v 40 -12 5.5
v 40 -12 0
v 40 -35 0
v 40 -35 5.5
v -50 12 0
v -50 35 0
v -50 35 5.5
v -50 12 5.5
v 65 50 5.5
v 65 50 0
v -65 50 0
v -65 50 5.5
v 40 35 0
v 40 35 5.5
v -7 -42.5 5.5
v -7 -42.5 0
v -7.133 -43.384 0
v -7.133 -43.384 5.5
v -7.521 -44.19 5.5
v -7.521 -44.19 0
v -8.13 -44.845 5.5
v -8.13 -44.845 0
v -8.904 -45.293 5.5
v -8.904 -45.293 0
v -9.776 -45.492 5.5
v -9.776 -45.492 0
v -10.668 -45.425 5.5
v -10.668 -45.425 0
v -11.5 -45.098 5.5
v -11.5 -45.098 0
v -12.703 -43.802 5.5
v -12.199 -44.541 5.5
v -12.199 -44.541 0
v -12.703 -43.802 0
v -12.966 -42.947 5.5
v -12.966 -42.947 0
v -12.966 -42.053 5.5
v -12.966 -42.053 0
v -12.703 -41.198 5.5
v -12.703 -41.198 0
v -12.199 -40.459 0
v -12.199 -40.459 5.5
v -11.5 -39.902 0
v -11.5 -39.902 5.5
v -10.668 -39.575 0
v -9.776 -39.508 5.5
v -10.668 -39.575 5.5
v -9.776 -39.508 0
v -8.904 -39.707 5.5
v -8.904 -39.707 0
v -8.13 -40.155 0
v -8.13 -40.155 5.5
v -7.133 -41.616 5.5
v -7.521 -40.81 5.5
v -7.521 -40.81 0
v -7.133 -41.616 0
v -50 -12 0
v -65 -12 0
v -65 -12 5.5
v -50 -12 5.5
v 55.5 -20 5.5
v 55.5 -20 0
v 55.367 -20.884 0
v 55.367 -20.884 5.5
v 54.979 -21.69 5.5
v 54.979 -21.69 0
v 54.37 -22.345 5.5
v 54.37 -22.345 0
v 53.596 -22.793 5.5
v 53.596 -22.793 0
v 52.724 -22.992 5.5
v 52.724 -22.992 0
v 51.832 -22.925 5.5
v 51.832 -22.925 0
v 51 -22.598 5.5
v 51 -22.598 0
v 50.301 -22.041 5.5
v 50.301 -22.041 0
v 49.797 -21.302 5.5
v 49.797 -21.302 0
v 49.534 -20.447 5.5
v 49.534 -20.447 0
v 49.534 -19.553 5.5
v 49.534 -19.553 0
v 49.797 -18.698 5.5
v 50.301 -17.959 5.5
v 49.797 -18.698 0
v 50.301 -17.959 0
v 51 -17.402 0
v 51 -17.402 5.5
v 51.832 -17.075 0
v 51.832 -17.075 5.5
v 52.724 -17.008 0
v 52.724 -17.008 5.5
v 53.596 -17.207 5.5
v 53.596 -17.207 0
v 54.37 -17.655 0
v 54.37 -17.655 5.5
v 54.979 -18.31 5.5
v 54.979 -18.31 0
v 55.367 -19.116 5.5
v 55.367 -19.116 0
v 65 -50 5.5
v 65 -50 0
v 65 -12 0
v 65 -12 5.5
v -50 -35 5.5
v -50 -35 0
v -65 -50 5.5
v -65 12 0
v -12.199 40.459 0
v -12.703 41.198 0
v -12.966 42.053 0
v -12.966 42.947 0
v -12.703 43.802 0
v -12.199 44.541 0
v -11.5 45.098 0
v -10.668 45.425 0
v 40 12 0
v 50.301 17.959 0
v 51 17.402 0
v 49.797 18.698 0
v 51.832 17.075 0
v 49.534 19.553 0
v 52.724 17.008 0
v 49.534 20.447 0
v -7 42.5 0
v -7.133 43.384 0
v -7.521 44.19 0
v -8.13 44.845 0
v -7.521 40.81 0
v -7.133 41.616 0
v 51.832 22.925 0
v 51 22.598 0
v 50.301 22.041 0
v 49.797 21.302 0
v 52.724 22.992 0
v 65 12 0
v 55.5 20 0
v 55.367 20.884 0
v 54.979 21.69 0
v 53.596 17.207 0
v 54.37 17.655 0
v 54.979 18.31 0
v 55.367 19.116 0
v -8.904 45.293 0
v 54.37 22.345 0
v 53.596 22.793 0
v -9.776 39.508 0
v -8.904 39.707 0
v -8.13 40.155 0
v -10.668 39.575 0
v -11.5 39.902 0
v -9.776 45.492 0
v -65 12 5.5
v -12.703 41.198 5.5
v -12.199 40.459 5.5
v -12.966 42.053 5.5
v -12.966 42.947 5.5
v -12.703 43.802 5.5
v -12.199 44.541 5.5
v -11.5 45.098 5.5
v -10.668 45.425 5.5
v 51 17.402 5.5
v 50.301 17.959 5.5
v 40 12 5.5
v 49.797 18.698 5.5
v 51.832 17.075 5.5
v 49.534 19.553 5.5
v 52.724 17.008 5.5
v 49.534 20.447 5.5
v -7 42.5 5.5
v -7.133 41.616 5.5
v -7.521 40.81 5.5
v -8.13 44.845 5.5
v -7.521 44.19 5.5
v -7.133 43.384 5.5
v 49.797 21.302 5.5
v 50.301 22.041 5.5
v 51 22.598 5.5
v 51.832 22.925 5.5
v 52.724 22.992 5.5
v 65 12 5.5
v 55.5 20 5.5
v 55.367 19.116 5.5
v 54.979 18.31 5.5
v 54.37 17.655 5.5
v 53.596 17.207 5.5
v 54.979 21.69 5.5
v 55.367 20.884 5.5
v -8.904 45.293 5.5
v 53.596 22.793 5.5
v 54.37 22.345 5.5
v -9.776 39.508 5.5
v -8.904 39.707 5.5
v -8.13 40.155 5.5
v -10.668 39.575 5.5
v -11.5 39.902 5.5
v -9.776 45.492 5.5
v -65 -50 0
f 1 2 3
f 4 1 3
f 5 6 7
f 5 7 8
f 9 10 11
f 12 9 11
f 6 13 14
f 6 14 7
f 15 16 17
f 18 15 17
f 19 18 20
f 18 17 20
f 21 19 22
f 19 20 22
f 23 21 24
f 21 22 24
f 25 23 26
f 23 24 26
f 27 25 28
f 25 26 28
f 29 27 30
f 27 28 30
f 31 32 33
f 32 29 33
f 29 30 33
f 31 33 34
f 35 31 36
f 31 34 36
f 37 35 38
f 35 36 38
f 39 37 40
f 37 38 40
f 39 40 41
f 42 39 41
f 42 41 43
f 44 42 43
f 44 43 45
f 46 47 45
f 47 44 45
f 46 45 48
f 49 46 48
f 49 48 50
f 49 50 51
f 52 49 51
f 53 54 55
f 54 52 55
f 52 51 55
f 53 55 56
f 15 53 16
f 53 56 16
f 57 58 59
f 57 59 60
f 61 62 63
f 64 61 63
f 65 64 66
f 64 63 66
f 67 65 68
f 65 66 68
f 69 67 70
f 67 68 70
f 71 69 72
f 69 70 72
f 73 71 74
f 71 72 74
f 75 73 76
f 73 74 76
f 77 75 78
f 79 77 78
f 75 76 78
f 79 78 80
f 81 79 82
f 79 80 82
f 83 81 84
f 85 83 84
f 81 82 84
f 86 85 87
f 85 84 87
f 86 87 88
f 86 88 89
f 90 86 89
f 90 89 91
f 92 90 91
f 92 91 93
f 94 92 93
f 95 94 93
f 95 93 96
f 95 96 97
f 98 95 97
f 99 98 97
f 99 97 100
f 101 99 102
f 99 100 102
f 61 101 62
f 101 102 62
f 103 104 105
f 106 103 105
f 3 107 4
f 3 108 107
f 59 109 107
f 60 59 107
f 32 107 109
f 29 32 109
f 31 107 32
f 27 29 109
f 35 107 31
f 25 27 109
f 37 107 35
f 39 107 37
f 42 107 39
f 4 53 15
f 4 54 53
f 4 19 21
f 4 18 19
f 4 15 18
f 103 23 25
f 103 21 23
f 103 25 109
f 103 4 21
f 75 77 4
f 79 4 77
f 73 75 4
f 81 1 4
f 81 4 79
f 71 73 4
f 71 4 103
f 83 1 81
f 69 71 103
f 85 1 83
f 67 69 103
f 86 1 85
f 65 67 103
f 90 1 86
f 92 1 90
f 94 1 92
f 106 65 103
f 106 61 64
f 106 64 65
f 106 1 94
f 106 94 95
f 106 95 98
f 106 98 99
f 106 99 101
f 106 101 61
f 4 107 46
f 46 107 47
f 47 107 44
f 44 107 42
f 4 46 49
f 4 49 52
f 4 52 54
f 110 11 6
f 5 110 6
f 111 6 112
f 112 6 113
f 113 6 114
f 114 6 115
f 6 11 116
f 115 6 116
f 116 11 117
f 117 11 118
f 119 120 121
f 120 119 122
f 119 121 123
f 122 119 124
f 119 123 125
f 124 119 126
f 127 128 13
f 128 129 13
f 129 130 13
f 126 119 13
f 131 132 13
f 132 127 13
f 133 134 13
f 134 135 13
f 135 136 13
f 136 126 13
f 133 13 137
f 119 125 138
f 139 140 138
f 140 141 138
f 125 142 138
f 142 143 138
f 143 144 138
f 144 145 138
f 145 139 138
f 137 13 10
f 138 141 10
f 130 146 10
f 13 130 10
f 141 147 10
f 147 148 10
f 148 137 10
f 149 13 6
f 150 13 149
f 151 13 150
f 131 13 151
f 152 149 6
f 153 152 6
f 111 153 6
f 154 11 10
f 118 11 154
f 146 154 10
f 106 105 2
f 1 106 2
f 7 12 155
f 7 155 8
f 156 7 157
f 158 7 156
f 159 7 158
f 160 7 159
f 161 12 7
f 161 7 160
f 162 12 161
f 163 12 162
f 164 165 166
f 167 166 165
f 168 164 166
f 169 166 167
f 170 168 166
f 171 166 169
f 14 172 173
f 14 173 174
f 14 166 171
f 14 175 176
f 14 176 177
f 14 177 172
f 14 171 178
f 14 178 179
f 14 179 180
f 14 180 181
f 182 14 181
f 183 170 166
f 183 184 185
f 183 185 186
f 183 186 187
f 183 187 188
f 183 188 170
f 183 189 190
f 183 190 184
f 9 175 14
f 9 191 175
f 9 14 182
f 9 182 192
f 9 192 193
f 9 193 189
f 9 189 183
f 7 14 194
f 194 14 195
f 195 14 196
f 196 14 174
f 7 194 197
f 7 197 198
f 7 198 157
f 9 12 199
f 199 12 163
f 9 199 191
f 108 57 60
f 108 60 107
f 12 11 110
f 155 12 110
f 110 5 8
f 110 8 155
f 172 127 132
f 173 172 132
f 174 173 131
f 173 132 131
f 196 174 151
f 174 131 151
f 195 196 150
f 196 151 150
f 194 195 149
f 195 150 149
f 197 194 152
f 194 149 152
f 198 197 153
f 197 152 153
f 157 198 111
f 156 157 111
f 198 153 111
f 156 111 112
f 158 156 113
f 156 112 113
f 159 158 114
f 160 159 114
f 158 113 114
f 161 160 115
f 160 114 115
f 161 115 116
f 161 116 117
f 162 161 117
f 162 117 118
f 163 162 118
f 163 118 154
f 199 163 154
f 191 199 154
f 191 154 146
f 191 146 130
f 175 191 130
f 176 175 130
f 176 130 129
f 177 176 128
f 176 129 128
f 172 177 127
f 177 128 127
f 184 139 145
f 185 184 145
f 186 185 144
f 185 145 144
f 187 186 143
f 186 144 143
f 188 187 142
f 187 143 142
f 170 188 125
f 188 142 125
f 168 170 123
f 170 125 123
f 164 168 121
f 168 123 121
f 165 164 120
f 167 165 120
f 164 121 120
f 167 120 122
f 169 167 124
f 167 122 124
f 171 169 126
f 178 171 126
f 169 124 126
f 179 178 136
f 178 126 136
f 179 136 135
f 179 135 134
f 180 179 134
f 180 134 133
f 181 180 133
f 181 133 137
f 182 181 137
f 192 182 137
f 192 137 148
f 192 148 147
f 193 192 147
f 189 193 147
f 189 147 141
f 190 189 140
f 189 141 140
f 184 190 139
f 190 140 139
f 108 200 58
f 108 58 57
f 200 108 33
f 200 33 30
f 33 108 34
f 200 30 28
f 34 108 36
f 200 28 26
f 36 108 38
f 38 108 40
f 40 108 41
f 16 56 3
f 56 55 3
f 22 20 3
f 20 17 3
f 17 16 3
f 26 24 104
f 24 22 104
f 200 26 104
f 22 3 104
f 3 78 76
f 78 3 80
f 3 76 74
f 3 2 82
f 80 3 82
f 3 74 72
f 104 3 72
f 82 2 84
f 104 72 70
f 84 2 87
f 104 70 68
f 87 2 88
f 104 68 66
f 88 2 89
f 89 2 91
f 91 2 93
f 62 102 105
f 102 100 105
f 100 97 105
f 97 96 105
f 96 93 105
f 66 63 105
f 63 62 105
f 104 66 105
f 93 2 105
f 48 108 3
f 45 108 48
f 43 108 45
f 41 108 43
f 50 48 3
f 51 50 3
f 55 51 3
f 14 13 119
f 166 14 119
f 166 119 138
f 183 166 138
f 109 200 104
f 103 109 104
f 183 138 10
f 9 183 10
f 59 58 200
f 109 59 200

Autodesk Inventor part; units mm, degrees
ref_plane "YZ Plane" through (0, 0, 0) normal (1, 0, 0) x (0, 1, 0)
ref_plane "XZ Plane" through (0, 0, 0) normal (0, 1, 0) x (-1, 0, 0)
ref_plane "XY Plane" through (0, 0, 0) normal (0, 0, 1) x (1, 0, 0)
sketch "Boceto1" plane through (0, 0, 0) normal (0, 0, 1) x (1, 0, 0)
  line L0 (-65, -50) -> (65, -50)
  line L1 (65, -50) -> (65, 50)
  line L2 (65, 50) -> (-65, 50)
  line L3 (-65, 50) -> (-65, -50)
  line L4 (-65, -50) -> (65, 50) construction
  line L5 (65, -50) -> (-65, 50) construction
  line L6 (-50, -35) -> (50, -35)
  line L7 (50, -35) -> (50, 35)
  line L8 (50, 35) -> (-50, 35)
  line L9 (-50, 35) -> (-50, -35)
  line L10 (-50, -35) -> (50, 35) construction
  line L11 (50, -35) -> (-50, 35) construction
  line L12 (0, 0) -> (-20, 0)
  line L13 (-20, 0) -> (-20, 35)
  line L14 (-50, 35) -> (50, 35)
  line L15 (-20, 0) -> (0, 0)
  line L16 (0, 0) -> (0, 35)
  line L17 (0, 35) -> (-20, 35)
  line L18 (-20, 35) -> (-20, 0)
  line L19 (50, -35) -> (-50, -35)
  line L20 (-20, 0) -> (0, 0)
  line L21 (0, 0) -> (0, -35)
  line L22 (0, -35) -> (-20, -35)
  line L23 (-20, -35) -> (-20, 0)
  line L24 (50, 35) -> (40, 35)
  line L25 (40, 35) -> (40, -35)
  line L26 (50, 35) -> (50, -35)
  line L27 (50, -35) -> (50, 35)
  line L28 (50, -35) -> (40, -35)
  line L29 (0, 0) -> (-20, 0)
  line L30 (-20, 35) -> (-20, -35)
  line L31 (-10, 0) -> (-10, 50)
  line L32 (65, 50) -> (-65, 50)
  line L33 (0, 35) -> (-10, 35)
  line L34 (-10, 35) -> (-10, 50)
  line L35 (-10, 50) -> (-10, 42.5)
  line L36 (-10, 0) -> (65, 0)
  line L37 (65, -50) -> (65, 50)
  line L38 (40, 35) -> (40, -35)
  line L39 (40, 0) -> (65, 0)
  line L40 (52.5, 0) -> (52.5, 20)
  circle A0 centre (-10, 42.5) radius 3
  circle A1 centre (52.5, 20) radius 3
  circle A2 centre (-10, -42.5) radius 3
  circle A3 centre (52.5, -20) radius 3
  line L41 (-50, 0) -> (-50, 12)
  line L42 (-50, 12) -> (-65, 12)
  line L43 (-65, 12) -> (-65, -12)
  line L44 (-65, -12) -> (-50, -12)
  line L45 (-50, 0) -> (-50, -12)
  line L46 (40, 0) -> (40, 12)
  line L47 (40, 12) -> (65, 12)
  line L48 (65, 12) -> (65, -12)
  line L49 (65, -12) -> (40, -12)
  point P0 (50, 12)
  point P1 (50, 18.3417)
  point P2 (52.5, 17)
  point P3 (52.5, 12)
  dimension "d0" = 130
  dimension "d2" = 100
  dimension "d4" = 20
  dimension "d7" = 6
  dimension "d9" = 12
  dimension "d10" = 24
  dimension "d11" = 12
  dimension "d12" = 24
extrude "Extrusión1" add sketch "Boceto1" along normal blind 5.5 contours L3 L44 L9 L6 L7 A3 L49 L1 L0 | L3 L2 L31 A0 L8 L9 L42 | L7 A3 L6 L25 L49 | L47 L40 A1 L7 L8 L31 A0 L2 L1 | L47 L7 A1 L40 | L47 L25 L8 L7 A1
properties part number "BASE_MID"
